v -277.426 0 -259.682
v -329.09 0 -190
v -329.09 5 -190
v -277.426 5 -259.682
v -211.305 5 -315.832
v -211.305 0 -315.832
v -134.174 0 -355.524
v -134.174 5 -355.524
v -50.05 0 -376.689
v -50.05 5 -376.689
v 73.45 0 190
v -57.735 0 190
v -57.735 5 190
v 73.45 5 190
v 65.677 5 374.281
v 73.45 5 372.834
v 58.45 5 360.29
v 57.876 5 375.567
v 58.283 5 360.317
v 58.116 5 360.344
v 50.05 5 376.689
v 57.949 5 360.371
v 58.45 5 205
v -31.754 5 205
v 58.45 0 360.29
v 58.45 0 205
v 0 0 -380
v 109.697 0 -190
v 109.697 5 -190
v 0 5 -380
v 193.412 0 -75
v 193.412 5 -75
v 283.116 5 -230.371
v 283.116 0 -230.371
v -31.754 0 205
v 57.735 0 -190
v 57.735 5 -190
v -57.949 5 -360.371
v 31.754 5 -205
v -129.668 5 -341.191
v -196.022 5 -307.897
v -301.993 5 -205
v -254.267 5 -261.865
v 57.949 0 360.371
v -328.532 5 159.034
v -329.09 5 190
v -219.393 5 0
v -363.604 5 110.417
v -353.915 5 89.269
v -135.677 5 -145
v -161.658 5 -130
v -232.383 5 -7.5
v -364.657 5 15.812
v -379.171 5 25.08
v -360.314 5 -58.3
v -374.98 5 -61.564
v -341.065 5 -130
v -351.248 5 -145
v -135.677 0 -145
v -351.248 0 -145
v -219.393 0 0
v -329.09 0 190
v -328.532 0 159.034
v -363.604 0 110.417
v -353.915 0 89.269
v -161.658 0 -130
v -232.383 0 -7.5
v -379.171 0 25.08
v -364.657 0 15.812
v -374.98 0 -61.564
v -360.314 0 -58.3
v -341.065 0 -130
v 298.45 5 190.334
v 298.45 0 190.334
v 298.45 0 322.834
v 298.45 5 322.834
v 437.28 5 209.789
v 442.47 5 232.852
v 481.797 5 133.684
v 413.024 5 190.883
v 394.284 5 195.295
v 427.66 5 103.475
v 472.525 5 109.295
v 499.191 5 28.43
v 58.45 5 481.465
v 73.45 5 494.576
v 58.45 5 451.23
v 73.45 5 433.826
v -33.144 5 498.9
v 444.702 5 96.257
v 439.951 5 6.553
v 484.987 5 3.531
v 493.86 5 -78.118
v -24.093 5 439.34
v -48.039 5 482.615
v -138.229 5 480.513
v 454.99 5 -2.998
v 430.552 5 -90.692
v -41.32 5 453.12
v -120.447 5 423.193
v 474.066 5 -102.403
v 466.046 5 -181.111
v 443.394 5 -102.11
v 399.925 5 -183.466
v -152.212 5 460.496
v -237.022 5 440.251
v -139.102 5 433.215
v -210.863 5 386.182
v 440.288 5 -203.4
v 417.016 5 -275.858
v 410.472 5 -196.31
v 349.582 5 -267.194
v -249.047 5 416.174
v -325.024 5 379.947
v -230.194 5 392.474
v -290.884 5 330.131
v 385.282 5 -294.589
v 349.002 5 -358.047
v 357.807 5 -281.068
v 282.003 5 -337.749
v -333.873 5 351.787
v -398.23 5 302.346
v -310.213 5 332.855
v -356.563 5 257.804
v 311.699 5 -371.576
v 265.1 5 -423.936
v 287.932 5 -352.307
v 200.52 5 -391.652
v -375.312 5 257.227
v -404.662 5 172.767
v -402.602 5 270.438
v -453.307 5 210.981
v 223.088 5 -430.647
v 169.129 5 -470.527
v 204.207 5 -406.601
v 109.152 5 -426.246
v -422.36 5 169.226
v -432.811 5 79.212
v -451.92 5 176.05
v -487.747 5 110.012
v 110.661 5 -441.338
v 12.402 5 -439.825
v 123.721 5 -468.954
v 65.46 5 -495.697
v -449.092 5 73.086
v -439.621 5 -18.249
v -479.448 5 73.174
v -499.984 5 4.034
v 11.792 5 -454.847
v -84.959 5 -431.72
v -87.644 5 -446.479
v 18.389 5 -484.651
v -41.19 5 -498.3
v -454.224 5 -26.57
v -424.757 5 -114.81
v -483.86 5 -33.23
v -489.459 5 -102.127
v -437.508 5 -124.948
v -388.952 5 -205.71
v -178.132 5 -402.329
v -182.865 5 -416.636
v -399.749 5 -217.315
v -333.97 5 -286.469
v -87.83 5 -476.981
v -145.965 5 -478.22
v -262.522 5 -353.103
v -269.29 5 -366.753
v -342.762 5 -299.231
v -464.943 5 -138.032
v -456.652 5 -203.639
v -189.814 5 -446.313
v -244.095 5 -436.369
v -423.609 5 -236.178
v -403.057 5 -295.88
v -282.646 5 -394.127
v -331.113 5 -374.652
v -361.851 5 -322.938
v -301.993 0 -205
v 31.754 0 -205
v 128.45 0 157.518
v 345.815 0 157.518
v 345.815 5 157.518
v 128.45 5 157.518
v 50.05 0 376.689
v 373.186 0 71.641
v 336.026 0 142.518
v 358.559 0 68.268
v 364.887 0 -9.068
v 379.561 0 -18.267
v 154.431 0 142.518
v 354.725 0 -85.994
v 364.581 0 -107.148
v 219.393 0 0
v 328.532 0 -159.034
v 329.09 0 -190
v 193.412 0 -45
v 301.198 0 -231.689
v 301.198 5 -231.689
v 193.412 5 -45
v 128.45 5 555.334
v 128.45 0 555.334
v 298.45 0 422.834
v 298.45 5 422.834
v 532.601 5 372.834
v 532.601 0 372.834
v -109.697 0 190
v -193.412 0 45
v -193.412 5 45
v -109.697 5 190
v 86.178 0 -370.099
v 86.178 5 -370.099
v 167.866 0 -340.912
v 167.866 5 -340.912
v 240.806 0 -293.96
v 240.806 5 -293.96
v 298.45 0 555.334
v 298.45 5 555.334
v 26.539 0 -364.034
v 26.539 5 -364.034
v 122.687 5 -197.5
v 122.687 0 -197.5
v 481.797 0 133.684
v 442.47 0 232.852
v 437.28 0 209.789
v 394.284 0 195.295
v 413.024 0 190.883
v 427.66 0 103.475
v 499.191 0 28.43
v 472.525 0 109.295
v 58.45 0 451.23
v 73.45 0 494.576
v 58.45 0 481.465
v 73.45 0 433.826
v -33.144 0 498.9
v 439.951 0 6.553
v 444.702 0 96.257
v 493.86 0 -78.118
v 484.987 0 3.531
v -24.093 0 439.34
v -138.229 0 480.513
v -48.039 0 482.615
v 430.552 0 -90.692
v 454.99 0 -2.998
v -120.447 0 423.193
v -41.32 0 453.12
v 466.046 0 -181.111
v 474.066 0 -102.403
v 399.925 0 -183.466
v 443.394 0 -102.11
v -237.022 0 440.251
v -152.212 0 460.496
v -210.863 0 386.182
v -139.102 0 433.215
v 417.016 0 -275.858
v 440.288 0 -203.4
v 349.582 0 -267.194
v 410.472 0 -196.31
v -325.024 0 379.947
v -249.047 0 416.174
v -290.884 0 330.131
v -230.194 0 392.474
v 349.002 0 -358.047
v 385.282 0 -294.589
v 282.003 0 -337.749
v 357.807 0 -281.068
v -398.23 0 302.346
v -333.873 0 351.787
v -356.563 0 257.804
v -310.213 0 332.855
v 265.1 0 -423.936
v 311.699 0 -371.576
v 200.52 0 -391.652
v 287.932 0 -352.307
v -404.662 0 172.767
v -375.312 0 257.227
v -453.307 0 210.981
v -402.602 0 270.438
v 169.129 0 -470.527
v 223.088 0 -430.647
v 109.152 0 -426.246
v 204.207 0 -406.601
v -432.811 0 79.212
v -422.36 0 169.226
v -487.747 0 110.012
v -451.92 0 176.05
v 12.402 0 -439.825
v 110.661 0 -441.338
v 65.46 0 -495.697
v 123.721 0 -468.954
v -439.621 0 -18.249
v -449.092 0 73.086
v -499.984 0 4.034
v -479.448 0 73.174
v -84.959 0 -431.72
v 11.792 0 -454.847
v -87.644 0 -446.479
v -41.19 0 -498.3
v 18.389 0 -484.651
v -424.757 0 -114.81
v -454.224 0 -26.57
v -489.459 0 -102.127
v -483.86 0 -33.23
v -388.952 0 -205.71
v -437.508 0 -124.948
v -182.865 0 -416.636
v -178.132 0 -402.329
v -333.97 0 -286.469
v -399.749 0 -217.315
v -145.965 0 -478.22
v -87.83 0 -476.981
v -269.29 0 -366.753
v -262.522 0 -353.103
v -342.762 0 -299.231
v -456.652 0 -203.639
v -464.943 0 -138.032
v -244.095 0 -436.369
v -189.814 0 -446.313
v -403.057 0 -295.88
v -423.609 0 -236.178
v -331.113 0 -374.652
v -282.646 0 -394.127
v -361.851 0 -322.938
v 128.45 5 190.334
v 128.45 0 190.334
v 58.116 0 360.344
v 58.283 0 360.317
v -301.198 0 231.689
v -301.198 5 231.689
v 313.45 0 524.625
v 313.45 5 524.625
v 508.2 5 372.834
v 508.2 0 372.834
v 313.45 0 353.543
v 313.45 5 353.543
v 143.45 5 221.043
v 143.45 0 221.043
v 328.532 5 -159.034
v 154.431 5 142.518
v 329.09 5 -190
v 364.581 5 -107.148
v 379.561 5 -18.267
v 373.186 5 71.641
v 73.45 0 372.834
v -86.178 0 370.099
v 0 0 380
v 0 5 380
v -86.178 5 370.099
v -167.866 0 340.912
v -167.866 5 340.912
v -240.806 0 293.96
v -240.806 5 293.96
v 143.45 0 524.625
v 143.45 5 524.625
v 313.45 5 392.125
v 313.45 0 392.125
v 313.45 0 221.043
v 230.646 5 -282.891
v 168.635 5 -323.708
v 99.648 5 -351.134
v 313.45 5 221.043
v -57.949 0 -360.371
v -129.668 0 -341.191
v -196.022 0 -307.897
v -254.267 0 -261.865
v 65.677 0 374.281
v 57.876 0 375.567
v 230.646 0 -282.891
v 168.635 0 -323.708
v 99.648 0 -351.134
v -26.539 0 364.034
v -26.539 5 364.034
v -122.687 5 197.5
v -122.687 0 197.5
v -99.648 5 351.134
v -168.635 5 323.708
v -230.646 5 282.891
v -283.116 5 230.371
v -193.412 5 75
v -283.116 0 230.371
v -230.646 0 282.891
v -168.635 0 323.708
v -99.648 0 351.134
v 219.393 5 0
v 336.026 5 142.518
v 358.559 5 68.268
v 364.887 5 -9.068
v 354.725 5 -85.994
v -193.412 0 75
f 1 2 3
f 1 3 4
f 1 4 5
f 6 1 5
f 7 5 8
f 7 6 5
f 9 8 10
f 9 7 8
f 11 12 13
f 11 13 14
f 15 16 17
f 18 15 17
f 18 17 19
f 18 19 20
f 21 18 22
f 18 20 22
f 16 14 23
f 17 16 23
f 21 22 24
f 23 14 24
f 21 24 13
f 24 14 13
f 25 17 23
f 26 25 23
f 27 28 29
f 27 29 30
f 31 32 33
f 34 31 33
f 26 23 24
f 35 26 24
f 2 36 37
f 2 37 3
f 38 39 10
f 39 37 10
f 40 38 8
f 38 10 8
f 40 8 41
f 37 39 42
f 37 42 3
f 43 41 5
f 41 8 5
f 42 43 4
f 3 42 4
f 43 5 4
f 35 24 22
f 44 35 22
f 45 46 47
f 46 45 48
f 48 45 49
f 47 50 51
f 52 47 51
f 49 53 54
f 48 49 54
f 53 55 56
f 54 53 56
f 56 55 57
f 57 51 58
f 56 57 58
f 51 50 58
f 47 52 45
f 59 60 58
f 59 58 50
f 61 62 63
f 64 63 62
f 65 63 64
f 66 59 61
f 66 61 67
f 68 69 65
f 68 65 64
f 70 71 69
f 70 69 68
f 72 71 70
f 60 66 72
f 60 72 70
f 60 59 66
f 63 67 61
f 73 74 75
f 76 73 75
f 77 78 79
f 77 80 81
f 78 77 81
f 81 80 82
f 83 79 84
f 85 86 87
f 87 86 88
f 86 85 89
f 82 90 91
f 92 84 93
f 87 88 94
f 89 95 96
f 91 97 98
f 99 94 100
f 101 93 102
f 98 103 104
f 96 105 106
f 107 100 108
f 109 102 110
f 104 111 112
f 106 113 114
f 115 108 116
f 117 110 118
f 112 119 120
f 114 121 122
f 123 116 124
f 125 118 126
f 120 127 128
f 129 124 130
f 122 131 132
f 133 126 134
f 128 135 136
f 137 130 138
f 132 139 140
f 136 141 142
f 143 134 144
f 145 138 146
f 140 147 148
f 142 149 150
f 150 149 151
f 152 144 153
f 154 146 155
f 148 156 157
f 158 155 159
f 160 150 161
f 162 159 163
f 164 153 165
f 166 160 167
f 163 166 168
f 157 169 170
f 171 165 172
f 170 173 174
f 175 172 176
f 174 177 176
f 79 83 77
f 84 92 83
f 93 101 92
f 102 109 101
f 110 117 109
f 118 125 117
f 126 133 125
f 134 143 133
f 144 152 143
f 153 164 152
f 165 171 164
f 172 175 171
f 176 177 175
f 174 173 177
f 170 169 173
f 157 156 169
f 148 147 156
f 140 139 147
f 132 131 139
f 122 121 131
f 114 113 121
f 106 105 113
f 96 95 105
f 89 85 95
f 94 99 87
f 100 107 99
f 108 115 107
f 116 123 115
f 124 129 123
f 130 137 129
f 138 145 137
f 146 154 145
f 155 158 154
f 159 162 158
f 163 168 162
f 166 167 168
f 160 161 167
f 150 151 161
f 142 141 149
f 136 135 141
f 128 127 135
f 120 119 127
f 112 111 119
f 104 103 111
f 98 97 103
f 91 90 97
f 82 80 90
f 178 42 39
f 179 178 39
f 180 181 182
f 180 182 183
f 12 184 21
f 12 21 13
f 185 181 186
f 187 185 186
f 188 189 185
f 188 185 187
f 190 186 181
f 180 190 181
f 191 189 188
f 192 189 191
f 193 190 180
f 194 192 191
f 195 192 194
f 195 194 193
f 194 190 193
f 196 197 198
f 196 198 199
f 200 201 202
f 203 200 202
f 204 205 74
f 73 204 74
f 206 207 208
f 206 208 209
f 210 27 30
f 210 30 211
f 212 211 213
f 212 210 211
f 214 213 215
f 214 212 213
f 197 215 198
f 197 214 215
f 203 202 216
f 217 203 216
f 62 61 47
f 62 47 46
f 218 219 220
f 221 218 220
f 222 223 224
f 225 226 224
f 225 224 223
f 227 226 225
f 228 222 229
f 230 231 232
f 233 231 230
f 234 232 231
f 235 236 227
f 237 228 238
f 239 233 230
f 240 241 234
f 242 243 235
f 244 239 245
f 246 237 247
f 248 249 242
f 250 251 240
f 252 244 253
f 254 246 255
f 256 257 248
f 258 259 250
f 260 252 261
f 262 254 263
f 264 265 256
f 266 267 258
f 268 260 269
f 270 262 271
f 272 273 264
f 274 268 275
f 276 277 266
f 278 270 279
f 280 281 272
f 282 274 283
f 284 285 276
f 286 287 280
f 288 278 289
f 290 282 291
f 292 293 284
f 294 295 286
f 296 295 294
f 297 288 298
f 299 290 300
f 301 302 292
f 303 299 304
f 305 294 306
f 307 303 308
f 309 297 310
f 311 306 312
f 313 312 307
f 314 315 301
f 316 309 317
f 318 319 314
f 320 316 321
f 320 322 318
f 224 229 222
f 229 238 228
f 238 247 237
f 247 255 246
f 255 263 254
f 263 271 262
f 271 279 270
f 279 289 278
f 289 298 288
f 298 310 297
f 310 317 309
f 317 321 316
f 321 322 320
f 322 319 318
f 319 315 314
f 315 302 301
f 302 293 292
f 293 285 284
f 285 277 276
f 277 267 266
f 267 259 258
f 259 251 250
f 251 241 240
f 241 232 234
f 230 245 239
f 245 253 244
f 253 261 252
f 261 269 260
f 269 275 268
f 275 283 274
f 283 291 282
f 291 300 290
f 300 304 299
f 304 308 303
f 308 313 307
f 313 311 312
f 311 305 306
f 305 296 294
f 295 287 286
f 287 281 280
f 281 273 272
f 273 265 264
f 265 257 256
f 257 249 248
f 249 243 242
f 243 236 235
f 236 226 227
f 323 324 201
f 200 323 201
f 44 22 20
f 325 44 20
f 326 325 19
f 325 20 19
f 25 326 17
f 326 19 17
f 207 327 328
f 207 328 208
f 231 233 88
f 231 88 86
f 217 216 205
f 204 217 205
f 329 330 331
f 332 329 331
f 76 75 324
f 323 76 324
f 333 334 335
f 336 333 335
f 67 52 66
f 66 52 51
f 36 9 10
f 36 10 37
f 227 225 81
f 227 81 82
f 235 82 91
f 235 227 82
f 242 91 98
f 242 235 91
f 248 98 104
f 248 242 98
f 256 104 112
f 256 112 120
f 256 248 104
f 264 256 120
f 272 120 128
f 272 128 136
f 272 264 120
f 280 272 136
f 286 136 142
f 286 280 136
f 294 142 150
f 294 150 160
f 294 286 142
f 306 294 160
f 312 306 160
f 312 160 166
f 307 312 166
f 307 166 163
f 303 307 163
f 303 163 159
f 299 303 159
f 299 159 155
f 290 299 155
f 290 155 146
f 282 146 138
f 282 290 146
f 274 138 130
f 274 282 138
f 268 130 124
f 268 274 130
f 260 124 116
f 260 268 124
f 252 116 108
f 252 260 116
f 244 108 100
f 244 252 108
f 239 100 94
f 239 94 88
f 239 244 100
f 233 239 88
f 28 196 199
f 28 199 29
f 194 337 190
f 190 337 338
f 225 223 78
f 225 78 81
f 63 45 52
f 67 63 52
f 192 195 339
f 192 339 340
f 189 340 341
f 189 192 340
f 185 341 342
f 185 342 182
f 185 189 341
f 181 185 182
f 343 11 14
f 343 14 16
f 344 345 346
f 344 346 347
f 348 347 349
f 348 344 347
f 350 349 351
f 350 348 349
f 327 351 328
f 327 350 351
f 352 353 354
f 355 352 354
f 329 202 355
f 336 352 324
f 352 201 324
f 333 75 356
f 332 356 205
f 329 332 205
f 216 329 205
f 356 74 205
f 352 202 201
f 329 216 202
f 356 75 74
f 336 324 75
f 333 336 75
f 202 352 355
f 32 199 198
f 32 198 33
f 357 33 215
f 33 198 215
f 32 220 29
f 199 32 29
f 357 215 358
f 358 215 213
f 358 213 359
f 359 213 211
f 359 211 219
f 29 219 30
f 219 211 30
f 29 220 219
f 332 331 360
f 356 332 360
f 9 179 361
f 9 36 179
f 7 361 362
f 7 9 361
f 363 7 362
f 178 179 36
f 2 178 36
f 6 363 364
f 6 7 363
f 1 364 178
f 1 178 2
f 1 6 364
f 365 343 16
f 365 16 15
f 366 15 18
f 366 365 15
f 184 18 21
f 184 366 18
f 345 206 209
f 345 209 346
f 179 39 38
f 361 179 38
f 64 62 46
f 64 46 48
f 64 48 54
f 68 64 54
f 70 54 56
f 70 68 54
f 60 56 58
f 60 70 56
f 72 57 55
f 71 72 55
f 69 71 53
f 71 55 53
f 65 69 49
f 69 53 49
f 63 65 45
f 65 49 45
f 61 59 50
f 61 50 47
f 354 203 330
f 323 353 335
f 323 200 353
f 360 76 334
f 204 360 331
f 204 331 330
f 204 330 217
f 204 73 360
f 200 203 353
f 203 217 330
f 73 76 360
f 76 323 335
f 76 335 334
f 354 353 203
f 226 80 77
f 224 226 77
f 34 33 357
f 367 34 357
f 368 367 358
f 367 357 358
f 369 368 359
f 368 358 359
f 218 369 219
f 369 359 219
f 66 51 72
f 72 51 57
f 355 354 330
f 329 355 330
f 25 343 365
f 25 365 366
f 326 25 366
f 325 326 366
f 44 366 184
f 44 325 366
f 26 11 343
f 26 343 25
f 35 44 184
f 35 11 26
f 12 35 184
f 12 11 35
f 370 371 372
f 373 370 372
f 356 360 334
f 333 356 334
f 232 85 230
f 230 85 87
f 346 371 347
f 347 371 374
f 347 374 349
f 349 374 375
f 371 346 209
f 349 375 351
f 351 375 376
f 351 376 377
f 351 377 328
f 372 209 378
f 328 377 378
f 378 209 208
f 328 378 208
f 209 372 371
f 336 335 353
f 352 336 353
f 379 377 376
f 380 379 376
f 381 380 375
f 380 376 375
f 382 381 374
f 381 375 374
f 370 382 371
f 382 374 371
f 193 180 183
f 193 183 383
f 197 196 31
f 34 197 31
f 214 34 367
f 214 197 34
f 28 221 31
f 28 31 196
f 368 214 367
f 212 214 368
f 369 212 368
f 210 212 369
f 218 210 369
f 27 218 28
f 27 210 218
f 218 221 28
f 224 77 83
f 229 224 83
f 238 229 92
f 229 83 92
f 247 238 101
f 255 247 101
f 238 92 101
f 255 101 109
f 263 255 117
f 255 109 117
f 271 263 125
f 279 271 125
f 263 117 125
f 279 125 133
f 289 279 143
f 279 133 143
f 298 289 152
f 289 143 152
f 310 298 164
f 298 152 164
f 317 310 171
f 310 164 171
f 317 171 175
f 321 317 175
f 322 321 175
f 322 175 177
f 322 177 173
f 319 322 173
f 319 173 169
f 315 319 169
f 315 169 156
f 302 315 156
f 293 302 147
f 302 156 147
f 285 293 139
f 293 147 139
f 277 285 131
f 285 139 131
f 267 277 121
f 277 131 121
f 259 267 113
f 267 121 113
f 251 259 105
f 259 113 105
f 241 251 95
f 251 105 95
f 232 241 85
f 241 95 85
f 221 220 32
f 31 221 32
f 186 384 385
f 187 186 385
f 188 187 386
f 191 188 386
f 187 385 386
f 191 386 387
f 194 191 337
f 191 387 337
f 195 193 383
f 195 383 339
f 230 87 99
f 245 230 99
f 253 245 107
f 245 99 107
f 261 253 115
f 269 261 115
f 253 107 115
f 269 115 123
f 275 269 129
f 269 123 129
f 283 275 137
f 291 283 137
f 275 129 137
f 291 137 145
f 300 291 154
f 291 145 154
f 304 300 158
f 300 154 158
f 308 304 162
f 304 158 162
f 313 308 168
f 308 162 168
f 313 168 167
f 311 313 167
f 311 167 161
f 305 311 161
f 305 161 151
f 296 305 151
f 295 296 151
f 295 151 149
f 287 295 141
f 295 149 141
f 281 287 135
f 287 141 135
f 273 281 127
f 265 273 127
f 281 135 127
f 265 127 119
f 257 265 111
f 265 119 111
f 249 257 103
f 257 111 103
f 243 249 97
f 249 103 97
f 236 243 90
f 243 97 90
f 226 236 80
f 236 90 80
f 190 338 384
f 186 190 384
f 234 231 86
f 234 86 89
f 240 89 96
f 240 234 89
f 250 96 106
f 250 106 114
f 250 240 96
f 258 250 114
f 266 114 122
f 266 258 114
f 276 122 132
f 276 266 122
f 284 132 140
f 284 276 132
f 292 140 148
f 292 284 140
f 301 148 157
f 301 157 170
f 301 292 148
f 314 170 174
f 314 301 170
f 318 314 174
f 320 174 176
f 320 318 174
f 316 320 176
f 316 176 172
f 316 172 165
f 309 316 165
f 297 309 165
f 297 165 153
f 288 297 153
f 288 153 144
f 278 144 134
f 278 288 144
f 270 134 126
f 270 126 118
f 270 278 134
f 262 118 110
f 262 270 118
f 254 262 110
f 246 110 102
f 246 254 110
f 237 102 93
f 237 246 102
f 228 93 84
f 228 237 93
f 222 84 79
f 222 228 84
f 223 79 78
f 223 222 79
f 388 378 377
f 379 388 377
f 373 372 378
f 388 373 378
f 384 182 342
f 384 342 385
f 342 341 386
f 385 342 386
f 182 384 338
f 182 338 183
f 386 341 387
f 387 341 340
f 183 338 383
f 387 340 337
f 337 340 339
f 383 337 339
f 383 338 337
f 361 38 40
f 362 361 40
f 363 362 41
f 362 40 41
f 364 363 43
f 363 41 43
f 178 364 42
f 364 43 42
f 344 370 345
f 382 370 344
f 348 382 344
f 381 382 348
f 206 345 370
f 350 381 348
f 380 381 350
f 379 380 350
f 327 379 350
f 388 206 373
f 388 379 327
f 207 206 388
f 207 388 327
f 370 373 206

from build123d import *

# Parameters (mm, degrees)
EXTRUDE_1_DEPTH     = 5
EXTRUDE_1_2_DEPTH   = 5
EXTRUDE_1_3_DEPTH   = 5
EXTRUDE_1_4_DEPTH   = 5
EXTRUDE_1_5_DEPTH   = 5
EXTRUDE_1_6_DEPTH   = 5
EXTRUDE_1_7_DEPTH   = 5
EXTRUDE_1_8_DEPTH   = 5
CUT_EXTRUDE_1_DEPTH = 5


with BuildPart() as part:
    # 草图1 → 凸台-拉伸1 (new body)
    with BuildSketch(Plane(origin=(0, 0, 0), x_dir=(1, 0, 0), z_dir=(0, 1, 0))):
        with BuildLine():
            Line((-109.696551146, 190), (-329.089653438, 190))
            ThreePointArc((-329.089653438, 190), (-211.305466091, 315.832233947), (-50.050204348, 376.68949686))
            Line((-50.050204348, 376.68949686), (57.735026919, 190))
            Line((57.735026919, 190), (-109.696551146, 190))
        make_face()
    extrude(amount=EXTRUDE_1_DEPTH)


with BuildPart() as body_2:
    # 草图1 → Extrude 1 2 (new body)
    with BuildSketch(Plane(origin=(0, 0, 0), x_dir=(1, 0, 0), z_dir=(0, 1, 0))):
        with BuildLine():
            Line((128.449935554, -157.518185391), (219.393102292, 0))
            Line((219.393102292, 0), (329.089653438, 190))
            ThreePointArc((329.089653438, 190), (379.560665165, 18.267497356), (345.815010187, -157.518185391))
            Line((345.815010187, -157.518185391), (128.449935554, -157.518185391))
        make_face()
    extrude(amount=EXTRUDE_1_2_DEPTH)


with BuildPart() as body_3:
    # 草图1 → Extrude 1 3 (new body)
    with BuildSketch(Plane(origin=(0, 0, 0), x_dir=(1, 0, 0), z_dir=(0, 1, 0))):
        with BuildLine():
            Line((193.412340179, 45), (109.696551146, 190))
            Line((109.696551146, 190), (0, 380))
            ThreePointArc((0, 380), (167.866004887, 340.912018567), (301.197571446, 231.68949686))
            Line((301.197571446, 231.68949686), (193.412340179, 45))
        make_face()
    extrude(amount=EXTRUDE_1_3_DEPTH)


with BuildPart() as body_4:
    # 草图1 → Extrude 1 4 (new body)
    with BuildSketch(Plane(origin=(0, 0, 0), x_dir=(1, 0, 0), z_dir=(0, 1, 0))):
        with BuildLine():
            Line((-135.67731326, 145), (-219.393102292, 0))
            Line((-219.393102292, 0), (-329.089653438, -190))
            ThreePointArc((-329.089653438, -190), (-379.171470978, -25.07978462), (-351.247775794, 145))
            Line((-351.247775794, 145), (-135.67731326, 145))
        make_face()
    extrude(amount=EXTRUDE_1_4_DEPTH)


with BuildPart() as body_5:
    # 草图1 → Extrude 1 5 (new body)
    with BuildSketch(Plane(origin=(0, 0, 0), x_dir=(1, 0, 0), z_dir=(0, 1, 0))):
        with BuildLine():
            Line((-193.412340179, -45), (-109.696551146, -190))
            Line((-109.696551146, -190), (0, -380))
            ThreePointArc((0, -380), (-167.866004887, -340.912018567), (-301.197571446, -231.68949686))
            Line((-301.197571446, -231.68949686), (-193.412340179, -45))
        make_face()
    extrude(amount=EXTRUDE_1_5_DEPTH)


with BuildPart() as body_6:
    # 草图1 → Extrude 1 6 (new body)
    with BuildSketch(Plane(origin=(0, 0, 0), x_dir=(1, 0, 0), z_dir=(0, 1, 0))):
        with BuildLine():
            Line((-57.735026919, -190), (73.449935554, -190))
            Line((73.449935554, -190), (73.449935554, -372.83388656))
            ThreePointArc((73.449935554, -372.83388656), (61.780155161, -374.944279098), (50.050204348, -376.68949686))
            Line((50.050204348, -376.68949686), (-57.735026919, -190))
        make_face()
    extrude(amount=EXTRUDE_1_6_DEPTH)


with BuildPart() as body_7:
    # 草图1 → Extrude 1 7 (new body)
    with BuildSketch(Plane(origin=(0, 0, 0), x_dir=(1, 0, 0), z_dir=(0, 1, 0))):
        Polygon((128.449935554, -190.33388656), (128.449935554, -555.33388656), (298.449935554, -422.83388656), (298.449935554, -555.33388656), (532.60087895, -372.83388656), (298.449935554, -190.33388656), (298.449935554, -322.83388656), align=None)
    extrude(amount=EXTRUDE_1_7_DEPTH)


with BuildPart() as body_8:
    # 草图1 → Extrude 1 8 (new body)
    with BuildSketch(Plane(origin=(0, 0, 0), x_dir=(1, 0, 0), z_dir=(0, 1, 0))):
        with BuildLine():
            Line((73.449935554, -433.82612527), (73.449935554, -494.57568376))
            ThreePointArc((73.449935554, -494.57568376), (-289.254482056, 407.838012709), (442.470113798, -232.852310264))
            Line((442.470113798, -232.852310264), (394.283817369, -195.29534393))
            ThreePointArc((394.283817369, -195.29534393), (-262.522283469, 353.103456061), (73.449935554, -433.82612527))
        make_face()
    extrude(amount=EXTRUDE_1_8_DEPTH)


with BuildPart() as cut_extrude_1_tool:
    # 草图2 → 切除-拉伸1 (new body)
    with BuildSketch(Plane(origin=(0, 5, 0), x_dir=(1, 0, 0), z_dir=(0, 1, 0))):
        with BuildLine():
            Line((-161.658075373, 130), (-341.064510027, 130))
            ThreePointArc((-341.064510027, 130), (-364.657361136, -15.811671935), (-328.531896481, -159.033936612))
            Line((-328.531896481, -159.033936612), (-232.383483349, 7.5))
            Line((-232.383483349, 7.5), (-161.658075373, 130))
        make_face()
        with BuildLine():
            Line((58.449935554, -205), (-31.754264805, -205))
            Line((-31.754264805, -205), (57.948952522, -360.370530013))
            ThreePointArc((57.948952522, -360.370530013), (58.199458101, -360.330158434), (58.449935554, -360.28961272))
            Line((58.449935554, -360.28961272), (58.449935554, -205))
        make_face()
        with BuildLine():
            Line((-193.412340179, -75), (-283.115557506, -230.370530013))
            ThreePointArc((-283.115557506, -230.370530013), (-168.635370996, -323.708374388), (-26.53851907, -364.033936612))
            Line((-26.53851907, -364.033936612), (-122.686932203, -197.5))
            Line((-122.686932203, -197.5), (-193.412340179, -75))
        make_face()
        with BuildLine():
            Line((31.754264805, 205), (-57.948952522, 360.370530013))
            ThreePointArc((-57.948952522, 360.370530013), (-196.02199014, 307.896702453), (-301.993377411, 205))
            Line((-301.993377411, 205), (-109.696551146, 205))
            Line((-109.696551146, 205), (31.754264805, 205))
        make_face()
        with BuildLine():
            Line((122.686932203, 197.5), (193.412340179, 75))
            Line((193.412340179, 75), (283.115557506, 230.370530013))
            ThreePointArc((283.115557506, 230.370530013), (168.635370996, 323.708374388), (26.53851907, 364.033936612))
            Line((26.53851907, 364.033936612), (122.686932203, 197.5))
        make_face()
        with BuildLine():
            Line((328.531896481, 159.033936612), (232.383483349, -7.5))
            Line((232.383483349, -7.5), (154.430697668, -142.518185391))
            Line((154.430697668, -142.518185391), (336.026140103, -142.518185391))
            ThreePointArc((336.026140103, -142.518185391), (364.887334075, 9.068265075), (328.531896481, 159.033936612))
        make_face()
        with BuildLine():
            Line((58.449935554, -481.465061073), (58.449935554, -451.230102092))
            ThreePointArc((58.449935554, -451.230102092), (-269.289684738, 366.753412654), (413.023640021, -190.883401017))
            Line((413.023640021, -190.883401017), (437.279781879, -209.788923348))
            ThreePointArc((437.279781879, -209.788923348), (-282.646367638, 394.126922274), (58.449935554, -481.465061073))
        make_face()
        Polygon((313.449935554, -392.124728933), (313.449935554, -524.624728933), (508.200450297, -372.83388656), (313.449935554, -221.043044187), (313.449935554, -353.543044187), (143.449935554, -221.043044187), (143.449935554, -524.624728933), align=None)
    extrude(amount=-CUT_EXTRUDE_1_DEPTH)


with BuildPart() as part_1:
    add(part.part)

    # 切除-拉伸1: cut by cut_extrude_1_tool
    add(cut_extrude_1_tool.part, mode=Mode.SUBTRACT)


with BuildPart() as body_2_1:
    add(body_2.part)

    # 切除-拉伸1: cut by cut_extrude_1_tool
    add(cut_extrude_1_tool.part, mode=Mode.SUBTRACT)


with BuildPart() as body_3_1:
    add(body_3.part)

    # 切除-拉伸1: cut by cut_extrude_1_tool
    add(cut_extrude_1_tool.part, mode=Mode.SUBTRACT)


with BuildPart() as body_4_1:
    add(body_4.part)

    # 切除-拉伸1: cut by cut_extrude_1_tool
    add(cut_extrude_1_tool.part, mode=Mode.SUBTRACT)


with BuildPart() as body_5_1:
    add(body_5.part)

    # 切除-拉伸1: cut by cut_extrude_1_tool
    add(cut_extrude_1_tool.part, mode=Mode.SUBTRACT)


with BuildPart() as body_6_1:
    add(body_6.part)

    # 切除-拉伸1: cut by cut_extrude_1_tool
    add(cut_extrude_1_tool.part, mode=Mode.SUBTRACT)


with BuildPart() as body_7_1:
    add(body_7.part)

    # 切除-拉伸1: cut by cut_extrude_1_tool
    add(cut_extrude_1_tool.part, mode=Mode.SUBTRACT)


with BuildPart() as body_8_1:
    add(body_8.part)

    # 切除-拉伸1: cut by cut_extrude_1_tool
    add(cut_extrude_1_tool.part, mode=Mode.SUBTRACT)


solid = Compound([part_1.part, body_2_1.part, body_3_1.part, body_4_1.part, body_5_1.part, body_6_1.part, body_7_1.part, body_8_1.part])
